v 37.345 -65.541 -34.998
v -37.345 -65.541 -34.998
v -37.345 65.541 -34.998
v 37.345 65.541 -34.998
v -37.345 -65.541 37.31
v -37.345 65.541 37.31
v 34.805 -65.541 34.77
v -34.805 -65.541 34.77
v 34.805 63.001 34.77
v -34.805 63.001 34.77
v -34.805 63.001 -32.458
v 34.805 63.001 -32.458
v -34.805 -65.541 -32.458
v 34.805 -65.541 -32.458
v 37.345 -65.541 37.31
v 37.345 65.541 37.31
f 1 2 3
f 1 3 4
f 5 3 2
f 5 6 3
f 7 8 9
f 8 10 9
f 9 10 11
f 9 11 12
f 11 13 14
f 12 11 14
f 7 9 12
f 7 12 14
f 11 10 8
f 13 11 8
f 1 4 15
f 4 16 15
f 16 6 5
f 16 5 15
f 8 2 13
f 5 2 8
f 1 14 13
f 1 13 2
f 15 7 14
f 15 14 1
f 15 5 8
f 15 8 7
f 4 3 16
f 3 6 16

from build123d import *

# Parameters (mm, degrees)
F0_W      = 74.689984
F0_H      = 131.0824
F1_DEPTH  = 37.31034
F1_FACE_W = 74.689984
F1_FACE_H = 131.0824
F2_DEPTH  = 34.998059
F3_T      = -2.54


with BuildPart() as f1:
    # F0 (on Top) → F1 (new body)
    with BuildSketch(Plane.XY):
        Rectangle(F0_W, F0_H)
    extrude(amount=F1_DEPTH)

    # F1_face (on face) → F2 (join)
    with BuildSketch(Plane(origin=(0, 0, 0), x_dir=(1, 0, 0), z_dir=(0, 0, -1))):
        Rectangle(F1_FACE_W, F1_FACE_H)
    extrude(amount=F2_DEPTH)

    # F3
    f3_openings = [f1.faces().sort_by_distance(p)[0] for p in [
        (0, -65.5412, 1.15614),
    ]]
    offset(amount=F3_T, openings=f3_openings)


solid = f1.part
